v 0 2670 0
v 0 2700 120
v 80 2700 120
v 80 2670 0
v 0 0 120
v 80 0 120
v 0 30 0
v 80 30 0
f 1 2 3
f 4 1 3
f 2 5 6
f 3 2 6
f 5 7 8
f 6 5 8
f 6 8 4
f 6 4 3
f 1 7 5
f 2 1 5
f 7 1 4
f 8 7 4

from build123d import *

# Parameters (mm, degrees)
F0_W     = 80
F0_H     = 120
F1_DEPTH = 2700
F2_SIZE2 = 29.99999
F2_SIZE  = 119.99999
F3_SIZE2 = 119.99999
F3_SIZE  = 29.99999


# Not quite as in the source:
# - a fillet or chamfer is up to 0.001 mm smaller than in the source, because OpenCascade refuses the exact size


with BuildPart() as f1:
    # F0 (on Front) → F1 (new body)
    with BuildSketch(Plane.XZ):
        with Locations((40, 60)):
            Rectangle(F0_W, F0_H)
    extrude(amount=-F1_DEPTH)

    # F2 (size 120 and 30 in the source; OpenCascade refuses exactly that, so slightly less here)
    f2_edges = [f1.edges().sort_by_distance(p)[0] for p in [
        (40, 0, 0),
    ]]
    f2_side = f1.faces().sort_by_distance((40, 0, 60))[0]
    chamfer(f2_edges, length=F2_SIZE, length2=F2_SIZE2, reference=f2_side)

    # F3 (size 30 and 120 in the source; OpenCascade refuses exactly that, so slightly less here)
    f3_edges = [f1.edges().sort_by_distance(p)[0] for p in [
        (40, 2700, 0),
    ]]
    f3_side = f1.faces().sort_by_distance((40, 1364.999995, 0))[0]
    chamfer(f3_edges, length=F3_SIZE, length2=F3_SIZE2, reference=f3_side)


solid = f1.part
